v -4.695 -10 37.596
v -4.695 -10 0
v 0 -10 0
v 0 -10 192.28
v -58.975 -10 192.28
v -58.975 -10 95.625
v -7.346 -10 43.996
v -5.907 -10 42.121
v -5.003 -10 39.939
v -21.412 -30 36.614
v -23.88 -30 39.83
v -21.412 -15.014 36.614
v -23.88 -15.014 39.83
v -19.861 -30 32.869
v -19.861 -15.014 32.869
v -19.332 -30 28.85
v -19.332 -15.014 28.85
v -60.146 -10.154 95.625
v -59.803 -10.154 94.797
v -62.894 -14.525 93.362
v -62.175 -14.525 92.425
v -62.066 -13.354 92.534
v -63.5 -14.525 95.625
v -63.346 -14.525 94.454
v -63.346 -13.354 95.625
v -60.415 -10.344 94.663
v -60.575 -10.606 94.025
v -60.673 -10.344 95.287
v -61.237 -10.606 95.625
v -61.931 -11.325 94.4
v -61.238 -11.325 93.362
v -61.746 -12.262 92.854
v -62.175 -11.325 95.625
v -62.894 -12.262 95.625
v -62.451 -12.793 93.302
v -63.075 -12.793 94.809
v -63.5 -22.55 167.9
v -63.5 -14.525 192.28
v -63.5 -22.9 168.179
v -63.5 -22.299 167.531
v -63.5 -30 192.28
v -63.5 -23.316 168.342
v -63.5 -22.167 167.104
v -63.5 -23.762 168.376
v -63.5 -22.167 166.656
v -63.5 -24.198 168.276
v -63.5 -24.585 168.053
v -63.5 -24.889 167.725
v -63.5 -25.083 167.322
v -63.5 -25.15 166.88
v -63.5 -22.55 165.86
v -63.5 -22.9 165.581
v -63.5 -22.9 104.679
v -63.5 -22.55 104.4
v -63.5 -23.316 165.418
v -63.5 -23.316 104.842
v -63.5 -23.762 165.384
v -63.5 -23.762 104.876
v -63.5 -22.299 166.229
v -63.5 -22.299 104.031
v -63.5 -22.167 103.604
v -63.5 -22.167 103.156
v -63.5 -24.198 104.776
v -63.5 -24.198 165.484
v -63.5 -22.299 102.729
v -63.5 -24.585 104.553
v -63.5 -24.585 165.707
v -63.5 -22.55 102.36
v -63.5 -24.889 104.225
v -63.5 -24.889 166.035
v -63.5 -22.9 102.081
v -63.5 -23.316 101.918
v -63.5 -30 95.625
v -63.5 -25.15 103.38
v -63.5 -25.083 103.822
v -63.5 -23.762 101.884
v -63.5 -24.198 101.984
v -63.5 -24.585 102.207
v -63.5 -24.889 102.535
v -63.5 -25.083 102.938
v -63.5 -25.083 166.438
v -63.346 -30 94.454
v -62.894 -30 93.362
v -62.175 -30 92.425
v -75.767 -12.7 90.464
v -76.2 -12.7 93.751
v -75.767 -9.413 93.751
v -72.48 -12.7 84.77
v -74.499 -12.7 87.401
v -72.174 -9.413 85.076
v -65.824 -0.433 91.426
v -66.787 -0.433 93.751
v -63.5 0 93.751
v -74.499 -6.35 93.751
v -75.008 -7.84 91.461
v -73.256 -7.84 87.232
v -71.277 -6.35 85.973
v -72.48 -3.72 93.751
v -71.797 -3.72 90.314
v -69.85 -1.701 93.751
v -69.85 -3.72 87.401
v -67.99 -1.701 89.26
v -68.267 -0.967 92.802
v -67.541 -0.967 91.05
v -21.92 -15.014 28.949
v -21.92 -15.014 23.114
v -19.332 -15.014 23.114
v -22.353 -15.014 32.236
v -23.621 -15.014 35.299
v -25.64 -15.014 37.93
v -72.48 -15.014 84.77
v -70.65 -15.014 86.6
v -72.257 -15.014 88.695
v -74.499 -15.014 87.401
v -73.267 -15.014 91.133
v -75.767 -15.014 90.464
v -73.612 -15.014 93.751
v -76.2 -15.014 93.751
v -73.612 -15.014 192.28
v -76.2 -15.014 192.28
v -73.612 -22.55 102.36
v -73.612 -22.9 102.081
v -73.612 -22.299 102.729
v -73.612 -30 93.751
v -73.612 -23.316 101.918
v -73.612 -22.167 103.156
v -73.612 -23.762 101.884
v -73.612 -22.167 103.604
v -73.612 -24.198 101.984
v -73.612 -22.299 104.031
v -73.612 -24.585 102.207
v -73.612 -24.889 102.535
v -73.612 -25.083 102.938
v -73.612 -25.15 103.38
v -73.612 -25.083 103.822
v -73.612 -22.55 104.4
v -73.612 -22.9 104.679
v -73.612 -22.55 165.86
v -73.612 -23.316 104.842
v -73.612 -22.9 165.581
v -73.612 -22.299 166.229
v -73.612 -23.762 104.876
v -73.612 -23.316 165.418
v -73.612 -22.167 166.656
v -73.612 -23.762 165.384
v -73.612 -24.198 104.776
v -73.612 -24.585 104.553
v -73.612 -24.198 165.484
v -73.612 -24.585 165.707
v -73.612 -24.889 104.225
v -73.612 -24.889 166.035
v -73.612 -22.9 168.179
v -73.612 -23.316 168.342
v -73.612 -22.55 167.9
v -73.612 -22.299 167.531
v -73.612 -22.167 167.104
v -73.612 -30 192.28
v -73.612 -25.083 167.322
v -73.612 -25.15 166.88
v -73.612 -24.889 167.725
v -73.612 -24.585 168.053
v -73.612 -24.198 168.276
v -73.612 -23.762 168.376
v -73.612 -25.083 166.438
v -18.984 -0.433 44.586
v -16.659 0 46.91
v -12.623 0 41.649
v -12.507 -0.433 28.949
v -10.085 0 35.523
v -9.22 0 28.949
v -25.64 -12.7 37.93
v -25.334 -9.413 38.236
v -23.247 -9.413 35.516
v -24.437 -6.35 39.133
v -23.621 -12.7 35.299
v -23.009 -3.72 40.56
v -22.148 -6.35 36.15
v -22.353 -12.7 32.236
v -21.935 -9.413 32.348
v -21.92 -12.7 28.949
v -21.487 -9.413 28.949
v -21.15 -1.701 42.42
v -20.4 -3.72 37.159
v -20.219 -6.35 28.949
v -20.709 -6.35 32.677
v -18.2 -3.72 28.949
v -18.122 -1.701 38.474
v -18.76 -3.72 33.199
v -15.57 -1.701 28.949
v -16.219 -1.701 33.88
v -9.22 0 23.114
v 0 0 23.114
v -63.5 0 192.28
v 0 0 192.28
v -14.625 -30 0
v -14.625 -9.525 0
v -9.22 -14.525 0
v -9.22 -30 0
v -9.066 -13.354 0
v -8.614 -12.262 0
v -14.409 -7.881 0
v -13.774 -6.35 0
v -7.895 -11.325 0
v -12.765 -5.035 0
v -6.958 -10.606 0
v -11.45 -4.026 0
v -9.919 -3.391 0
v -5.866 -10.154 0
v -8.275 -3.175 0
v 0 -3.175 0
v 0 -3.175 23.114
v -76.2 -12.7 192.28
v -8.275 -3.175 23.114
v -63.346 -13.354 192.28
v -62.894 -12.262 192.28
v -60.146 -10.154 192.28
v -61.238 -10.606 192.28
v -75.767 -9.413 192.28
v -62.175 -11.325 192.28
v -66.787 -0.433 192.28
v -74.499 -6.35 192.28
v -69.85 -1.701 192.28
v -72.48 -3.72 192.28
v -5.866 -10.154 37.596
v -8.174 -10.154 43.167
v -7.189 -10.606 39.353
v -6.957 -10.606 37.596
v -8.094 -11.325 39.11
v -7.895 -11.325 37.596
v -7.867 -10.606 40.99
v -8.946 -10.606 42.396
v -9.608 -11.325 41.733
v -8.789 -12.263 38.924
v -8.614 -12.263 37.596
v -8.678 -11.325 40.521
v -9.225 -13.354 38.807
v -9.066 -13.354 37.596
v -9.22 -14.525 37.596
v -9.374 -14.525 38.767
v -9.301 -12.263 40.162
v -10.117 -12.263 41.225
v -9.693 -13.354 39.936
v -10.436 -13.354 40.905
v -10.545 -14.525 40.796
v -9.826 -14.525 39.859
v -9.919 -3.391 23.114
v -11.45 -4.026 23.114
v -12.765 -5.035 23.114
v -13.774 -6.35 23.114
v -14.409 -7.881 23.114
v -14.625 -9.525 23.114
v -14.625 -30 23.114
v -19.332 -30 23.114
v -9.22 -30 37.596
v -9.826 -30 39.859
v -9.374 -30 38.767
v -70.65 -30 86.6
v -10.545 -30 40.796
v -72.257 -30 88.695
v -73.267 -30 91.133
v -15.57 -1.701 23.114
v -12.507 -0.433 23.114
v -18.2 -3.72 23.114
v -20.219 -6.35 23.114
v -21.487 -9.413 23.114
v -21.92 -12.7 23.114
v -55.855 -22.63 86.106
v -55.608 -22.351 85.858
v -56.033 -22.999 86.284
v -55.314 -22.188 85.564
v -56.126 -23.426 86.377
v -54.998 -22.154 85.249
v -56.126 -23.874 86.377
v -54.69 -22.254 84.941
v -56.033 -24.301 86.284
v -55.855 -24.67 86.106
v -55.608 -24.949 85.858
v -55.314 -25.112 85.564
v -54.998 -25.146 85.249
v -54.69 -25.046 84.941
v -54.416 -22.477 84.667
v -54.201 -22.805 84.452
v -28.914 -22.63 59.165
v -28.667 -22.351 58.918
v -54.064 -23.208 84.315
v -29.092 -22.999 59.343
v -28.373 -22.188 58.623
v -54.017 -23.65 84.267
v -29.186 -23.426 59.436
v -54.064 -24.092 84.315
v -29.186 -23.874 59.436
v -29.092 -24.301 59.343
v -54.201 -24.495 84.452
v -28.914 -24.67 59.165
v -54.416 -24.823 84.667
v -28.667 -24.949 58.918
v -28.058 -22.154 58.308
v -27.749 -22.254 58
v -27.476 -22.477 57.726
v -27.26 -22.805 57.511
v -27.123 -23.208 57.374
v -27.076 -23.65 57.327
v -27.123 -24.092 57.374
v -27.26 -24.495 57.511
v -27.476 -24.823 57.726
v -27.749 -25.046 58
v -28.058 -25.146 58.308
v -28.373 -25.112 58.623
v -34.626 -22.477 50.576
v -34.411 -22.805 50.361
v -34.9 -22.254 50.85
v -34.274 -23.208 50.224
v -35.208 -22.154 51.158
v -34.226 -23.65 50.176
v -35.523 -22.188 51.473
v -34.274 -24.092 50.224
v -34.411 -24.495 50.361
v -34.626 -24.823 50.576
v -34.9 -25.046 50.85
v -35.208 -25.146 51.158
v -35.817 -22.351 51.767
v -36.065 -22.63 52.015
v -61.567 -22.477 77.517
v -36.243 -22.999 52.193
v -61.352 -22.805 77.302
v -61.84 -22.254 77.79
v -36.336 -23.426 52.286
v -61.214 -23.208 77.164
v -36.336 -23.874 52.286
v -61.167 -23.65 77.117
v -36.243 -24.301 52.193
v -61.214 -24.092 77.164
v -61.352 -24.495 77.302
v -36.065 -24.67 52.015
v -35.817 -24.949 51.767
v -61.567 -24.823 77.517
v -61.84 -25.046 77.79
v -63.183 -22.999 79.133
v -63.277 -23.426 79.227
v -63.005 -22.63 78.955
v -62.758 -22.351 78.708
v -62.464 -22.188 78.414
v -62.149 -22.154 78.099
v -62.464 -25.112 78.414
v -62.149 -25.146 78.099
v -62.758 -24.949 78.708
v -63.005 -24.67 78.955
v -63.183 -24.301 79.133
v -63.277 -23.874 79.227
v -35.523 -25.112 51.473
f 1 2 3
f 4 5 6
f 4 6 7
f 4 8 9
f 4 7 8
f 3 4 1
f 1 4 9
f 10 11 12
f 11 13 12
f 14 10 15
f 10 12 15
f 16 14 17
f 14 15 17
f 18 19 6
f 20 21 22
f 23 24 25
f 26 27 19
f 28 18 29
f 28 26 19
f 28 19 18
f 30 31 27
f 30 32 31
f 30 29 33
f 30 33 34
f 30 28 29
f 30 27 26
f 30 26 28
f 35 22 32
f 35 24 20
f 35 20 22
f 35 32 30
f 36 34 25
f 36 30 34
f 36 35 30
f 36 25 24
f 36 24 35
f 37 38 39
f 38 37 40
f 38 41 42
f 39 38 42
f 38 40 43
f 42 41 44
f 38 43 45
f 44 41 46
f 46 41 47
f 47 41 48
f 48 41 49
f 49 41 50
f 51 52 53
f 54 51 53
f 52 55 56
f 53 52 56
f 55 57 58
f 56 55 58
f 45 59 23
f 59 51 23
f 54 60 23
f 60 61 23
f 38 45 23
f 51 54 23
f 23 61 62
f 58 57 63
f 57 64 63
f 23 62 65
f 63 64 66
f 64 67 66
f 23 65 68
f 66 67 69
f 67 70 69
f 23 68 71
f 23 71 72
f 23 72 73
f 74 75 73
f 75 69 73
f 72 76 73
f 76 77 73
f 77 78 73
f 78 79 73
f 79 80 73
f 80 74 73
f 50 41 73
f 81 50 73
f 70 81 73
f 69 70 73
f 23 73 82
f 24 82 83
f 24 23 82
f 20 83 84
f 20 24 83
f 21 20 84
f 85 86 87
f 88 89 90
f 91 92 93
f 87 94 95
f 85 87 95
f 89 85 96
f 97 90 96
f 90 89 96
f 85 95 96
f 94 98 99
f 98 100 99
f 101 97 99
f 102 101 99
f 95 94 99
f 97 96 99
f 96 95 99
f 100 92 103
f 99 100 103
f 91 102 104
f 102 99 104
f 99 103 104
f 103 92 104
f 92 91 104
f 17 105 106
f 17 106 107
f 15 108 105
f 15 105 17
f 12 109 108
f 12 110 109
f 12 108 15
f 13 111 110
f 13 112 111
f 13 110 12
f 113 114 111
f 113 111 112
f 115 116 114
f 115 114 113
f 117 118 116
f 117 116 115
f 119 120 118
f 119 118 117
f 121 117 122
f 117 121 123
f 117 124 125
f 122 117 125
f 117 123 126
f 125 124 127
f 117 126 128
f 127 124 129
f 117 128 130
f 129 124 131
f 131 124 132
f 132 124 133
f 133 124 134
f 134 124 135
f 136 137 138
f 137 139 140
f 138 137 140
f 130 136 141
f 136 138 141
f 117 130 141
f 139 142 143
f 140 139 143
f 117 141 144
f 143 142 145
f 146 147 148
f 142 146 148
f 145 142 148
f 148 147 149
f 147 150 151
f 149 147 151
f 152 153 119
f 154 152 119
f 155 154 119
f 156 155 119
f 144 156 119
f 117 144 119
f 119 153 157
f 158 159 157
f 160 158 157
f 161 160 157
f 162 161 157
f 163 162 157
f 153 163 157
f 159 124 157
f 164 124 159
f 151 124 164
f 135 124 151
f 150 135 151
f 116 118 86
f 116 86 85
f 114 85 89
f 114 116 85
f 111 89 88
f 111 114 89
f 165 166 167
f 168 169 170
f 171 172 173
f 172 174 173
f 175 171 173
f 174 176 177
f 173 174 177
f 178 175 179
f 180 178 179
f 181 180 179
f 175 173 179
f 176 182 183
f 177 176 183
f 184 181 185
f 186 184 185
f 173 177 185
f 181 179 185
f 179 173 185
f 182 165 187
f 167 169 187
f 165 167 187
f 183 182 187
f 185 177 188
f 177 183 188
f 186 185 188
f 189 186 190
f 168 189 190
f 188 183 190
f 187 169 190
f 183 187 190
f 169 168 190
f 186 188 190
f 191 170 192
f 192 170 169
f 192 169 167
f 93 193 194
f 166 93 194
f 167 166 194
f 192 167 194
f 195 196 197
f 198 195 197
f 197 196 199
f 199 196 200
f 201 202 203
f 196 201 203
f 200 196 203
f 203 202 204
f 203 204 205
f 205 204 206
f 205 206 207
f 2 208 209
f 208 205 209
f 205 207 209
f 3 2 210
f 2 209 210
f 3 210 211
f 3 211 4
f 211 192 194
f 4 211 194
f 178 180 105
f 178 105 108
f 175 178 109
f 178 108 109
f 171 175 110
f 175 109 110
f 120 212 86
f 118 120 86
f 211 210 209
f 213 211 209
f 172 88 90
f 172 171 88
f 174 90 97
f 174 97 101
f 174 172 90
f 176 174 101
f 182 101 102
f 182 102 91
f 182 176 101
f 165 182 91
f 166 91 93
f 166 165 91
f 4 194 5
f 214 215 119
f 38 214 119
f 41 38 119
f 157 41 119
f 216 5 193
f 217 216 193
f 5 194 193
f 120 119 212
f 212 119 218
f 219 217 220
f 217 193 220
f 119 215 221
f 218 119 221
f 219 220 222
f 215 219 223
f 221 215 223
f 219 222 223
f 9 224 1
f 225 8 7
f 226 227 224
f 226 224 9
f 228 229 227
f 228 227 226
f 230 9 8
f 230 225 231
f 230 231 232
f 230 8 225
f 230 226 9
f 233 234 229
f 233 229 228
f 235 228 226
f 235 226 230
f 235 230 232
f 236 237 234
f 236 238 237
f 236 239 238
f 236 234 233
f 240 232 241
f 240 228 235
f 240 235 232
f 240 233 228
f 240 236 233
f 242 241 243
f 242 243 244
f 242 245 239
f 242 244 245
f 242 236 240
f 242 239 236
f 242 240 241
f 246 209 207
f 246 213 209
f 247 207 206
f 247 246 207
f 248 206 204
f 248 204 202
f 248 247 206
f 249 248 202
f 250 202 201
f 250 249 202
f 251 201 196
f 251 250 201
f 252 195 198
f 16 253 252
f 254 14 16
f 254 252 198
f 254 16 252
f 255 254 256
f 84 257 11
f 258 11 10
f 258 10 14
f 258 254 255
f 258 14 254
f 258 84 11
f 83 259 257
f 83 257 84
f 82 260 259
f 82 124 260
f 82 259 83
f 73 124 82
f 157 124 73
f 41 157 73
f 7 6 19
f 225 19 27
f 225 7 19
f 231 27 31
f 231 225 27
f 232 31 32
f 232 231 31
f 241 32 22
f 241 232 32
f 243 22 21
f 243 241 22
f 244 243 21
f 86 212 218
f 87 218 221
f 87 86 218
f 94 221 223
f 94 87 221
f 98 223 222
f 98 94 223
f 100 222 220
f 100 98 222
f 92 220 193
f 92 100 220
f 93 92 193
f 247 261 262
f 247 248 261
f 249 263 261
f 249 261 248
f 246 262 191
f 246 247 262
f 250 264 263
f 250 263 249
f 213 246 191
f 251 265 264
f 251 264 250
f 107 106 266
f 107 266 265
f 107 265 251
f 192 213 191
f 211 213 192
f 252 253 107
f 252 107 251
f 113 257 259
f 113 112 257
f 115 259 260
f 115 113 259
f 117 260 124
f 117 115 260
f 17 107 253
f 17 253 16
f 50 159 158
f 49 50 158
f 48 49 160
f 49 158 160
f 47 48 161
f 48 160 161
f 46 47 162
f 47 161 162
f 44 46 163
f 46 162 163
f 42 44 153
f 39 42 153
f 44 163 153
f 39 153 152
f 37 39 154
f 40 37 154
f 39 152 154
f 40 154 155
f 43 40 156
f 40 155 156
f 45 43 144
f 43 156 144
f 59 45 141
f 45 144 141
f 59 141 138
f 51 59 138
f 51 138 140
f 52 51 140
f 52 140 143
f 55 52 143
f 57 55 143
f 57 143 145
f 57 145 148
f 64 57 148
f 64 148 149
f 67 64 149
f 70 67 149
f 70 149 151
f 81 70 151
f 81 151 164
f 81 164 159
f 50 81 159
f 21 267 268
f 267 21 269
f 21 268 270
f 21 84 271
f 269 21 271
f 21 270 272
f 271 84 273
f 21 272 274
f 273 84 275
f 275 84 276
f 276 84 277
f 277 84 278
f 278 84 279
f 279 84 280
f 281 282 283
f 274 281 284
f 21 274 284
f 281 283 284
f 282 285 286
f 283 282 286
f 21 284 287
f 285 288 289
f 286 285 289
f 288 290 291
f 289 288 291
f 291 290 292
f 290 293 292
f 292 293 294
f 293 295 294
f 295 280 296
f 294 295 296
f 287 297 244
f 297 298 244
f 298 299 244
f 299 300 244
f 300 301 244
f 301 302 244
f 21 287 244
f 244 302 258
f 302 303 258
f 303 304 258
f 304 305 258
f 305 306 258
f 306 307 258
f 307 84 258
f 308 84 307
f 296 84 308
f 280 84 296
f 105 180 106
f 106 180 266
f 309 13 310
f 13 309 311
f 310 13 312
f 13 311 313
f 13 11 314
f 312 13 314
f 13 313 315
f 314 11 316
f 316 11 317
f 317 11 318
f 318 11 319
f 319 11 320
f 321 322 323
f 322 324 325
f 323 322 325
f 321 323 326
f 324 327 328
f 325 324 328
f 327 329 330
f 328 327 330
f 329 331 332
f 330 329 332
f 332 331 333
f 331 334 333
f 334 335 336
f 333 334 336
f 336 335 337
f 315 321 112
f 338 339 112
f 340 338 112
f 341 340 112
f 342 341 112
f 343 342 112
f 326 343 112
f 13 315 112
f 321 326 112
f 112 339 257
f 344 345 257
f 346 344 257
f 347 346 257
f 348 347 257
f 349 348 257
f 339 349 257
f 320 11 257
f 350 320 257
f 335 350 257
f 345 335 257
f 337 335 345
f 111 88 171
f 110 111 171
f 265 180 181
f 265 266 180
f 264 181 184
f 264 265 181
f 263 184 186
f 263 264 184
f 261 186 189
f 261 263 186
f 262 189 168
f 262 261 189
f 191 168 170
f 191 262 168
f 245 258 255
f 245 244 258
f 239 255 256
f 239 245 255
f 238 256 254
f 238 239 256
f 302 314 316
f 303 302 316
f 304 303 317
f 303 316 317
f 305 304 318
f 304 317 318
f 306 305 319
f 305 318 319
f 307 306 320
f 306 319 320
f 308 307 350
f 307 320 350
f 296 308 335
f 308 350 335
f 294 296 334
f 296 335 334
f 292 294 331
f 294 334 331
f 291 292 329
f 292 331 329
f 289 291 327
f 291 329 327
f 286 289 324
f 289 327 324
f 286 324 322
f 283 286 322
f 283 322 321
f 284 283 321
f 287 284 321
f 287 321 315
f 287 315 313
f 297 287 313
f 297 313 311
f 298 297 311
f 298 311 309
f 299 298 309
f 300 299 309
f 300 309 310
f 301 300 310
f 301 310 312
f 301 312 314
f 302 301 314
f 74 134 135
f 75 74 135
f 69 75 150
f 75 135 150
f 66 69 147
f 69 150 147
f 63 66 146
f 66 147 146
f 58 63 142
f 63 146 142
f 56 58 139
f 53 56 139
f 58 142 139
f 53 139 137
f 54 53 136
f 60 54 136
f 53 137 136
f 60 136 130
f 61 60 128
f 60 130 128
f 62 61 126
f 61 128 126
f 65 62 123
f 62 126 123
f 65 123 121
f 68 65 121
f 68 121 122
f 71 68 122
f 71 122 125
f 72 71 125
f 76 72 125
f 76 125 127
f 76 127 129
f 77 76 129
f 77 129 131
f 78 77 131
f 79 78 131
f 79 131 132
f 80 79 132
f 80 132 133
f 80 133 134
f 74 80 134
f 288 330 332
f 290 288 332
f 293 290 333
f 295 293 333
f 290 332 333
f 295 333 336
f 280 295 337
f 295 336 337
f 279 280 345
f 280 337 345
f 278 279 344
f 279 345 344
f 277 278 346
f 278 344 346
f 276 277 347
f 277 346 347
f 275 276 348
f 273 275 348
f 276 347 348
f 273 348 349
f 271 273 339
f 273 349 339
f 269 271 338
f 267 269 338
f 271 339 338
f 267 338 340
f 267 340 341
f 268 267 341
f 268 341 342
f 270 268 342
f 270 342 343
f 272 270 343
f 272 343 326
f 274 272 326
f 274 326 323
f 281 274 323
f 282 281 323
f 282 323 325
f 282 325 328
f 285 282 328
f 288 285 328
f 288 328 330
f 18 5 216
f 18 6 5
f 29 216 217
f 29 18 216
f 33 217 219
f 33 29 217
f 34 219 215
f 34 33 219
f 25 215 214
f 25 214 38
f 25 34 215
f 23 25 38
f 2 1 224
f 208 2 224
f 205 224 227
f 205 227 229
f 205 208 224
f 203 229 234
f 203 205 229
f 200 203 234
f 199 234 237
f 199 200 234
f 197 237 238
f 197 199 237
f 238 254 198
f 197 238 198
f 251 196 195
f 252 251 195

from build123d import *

# Parameters (mm, degrees)
F1_DEPTH  = 30
F3_DEPTH  = 20
F5_DEPTH  = 14.986
F6_R      = 10.112
F7_R      = 15.528
F8_R      = 12.7
F10_DEPTH = 23.114
F11_R     = 12.7
F12_R     = 6.35
F13_R     = 4.525
F14_R     = 1.5
F15_DEPTH = 73.613
F16_R     = 1.5
F17_DEPTH = 124.6851495458


with BuildPart() as f1:
    # F0 (on Front) → F1 (new body)
    with BuildSketch(Plane.XZ):
        Polygon((-15.57, 0), (0, 0), (0, 192.28), (-76.2, 192.28), (-76.2, 88.49), (-21.92, 34.21), (-21.92, 22.17), (-15.57, 22.17), align=None)
    extrude(amount=F1_DEPTH)

    # F2 (on face) → F3 (cut)
    with BuildSketch(Plane.XZ.offset(30)):
        Polygon((0, 192.28), (-63.5, 192.28), (-63.5, 93.7505122421), (-9.22, 39.4705122421), (-9.22, 0), (0, 0), align=None)
    extrude(amount=-F3_DEPTH, mode=Mode.SUBTRACT)

    # F4 (on face) → F5 (cut)
    with BuildSketch(Plane.XZ.offset(30)):
        Polygon((-73.612, 192.28), (-76.2, 192.28), (-76.2, 88.49), (-21.92, 34.21), (-21.92, 22.17), (-19.332, 22.17), (-19.332, 35.2819846994), (-73.612, 89.5619846994), align=None)
    extrude(amount=-F5_DEPTH, mode=Mode.SUBTRACT)

    # F6
    f6_edges = [f1.edges().sort_by_distance(p)[0] for p in [
        (-73.612, -22.507, 89.561985),
    ]]
    fillet(f6_edges, radius=F6_R)

    # F7
    f7_edges = [f1.edges().sort_by_distance(p)[0] for p in [
        (-19.332, -22.507, 35.281985),
    ]]
    fillet(f7_edges, radius=F7_R)

    # F8
    f8_edges = [f1.edges().sort_by_distance(p)[0] for p in [
        (-76.2, -7.507, 88.49),
        (-21.92, -7.507, 34.21),
    ]]
    fillet(f8_edges, radius=F8_R)

    # F9 (on face) → F10 (cut)
    with BuildSketch(Plane(origin=(0, 0, 0), x_dir=(1, 0, 0), z_dir=(0, 0, -1))):
        Polygon((-29.2910200357, 0), (0, 0), (0, 3.175), (-14.625, 3.175), (-14.625, 30), (-29.2910200357, 30), align=None)
    extrude(amount=-F10_DEPTH, mode=Mode.SUBTRACT)

    # F11
    f11_edges = [f1.edges().sort_by_distance(p)[0] for p in [
        (-76.2, 0, 143.015256),
        (-75.23327, 0, 88.890433),
        (-49.06, 0, 61.35),
        (-22.88673, 0, 33.809567),
        (-21.92, 0, 26.031744),
    ]]
    fillet(f11_edges, radius=F11_R)

    # F12
    f12_edges = [f1.edges().sort_by_distance(p)[0] for p in [
        (-14.625, -3.175, 11.557),
    ]]
    fillet(f12_edges, radius=F12_R)

    # F13
    f13_edges = [f1.edges().sort_by_distance(p)[0] for p in [
        (-9.22, -10, 19.735256),
        (-36.36, -10, 66.610512),
        (-63.5, -10, 143.015256),
        (-63.5, -20, 93.750512),
        (-9.22, -20, 39.470512),
    ]]
    fillet(f13_edges, radius=F13_R)

    # F14 (on face) → F15 (cut, through all)
    with BuildSketch(Plane(origin=(-73.612, 0, 0), x_dir=(0, -1, 0), z_dir=(-1, 0, 0))):
        with Locations((23.65, 166.88)):
            Circle(F14_R)
        with Locations((23.65, 103.38)):
            Circle(F14_R)
    extrude(amount=-F15_DEPTH, mode=Mode.SUBTRACT)

    # F16 (on face) → F17 (cut, through all)
    with BuildSketch(Plane(origin=(7.9749923497, 0, 7.9749923497), x_dir=(0.7071067812, 0, -0.7071067812), z_dir=(-0.7071067812, 0, -0.7071067812))):
        with Locations((-99.281846784, 23.65)):
            Circle(F16_R)
        with Locations((-61.181846784, 23.65)):
            Circle(F16_R)
    extrude(amount=-F17_DEPTH, mode=Mode.SUBTRACT)


solid = f1.part
